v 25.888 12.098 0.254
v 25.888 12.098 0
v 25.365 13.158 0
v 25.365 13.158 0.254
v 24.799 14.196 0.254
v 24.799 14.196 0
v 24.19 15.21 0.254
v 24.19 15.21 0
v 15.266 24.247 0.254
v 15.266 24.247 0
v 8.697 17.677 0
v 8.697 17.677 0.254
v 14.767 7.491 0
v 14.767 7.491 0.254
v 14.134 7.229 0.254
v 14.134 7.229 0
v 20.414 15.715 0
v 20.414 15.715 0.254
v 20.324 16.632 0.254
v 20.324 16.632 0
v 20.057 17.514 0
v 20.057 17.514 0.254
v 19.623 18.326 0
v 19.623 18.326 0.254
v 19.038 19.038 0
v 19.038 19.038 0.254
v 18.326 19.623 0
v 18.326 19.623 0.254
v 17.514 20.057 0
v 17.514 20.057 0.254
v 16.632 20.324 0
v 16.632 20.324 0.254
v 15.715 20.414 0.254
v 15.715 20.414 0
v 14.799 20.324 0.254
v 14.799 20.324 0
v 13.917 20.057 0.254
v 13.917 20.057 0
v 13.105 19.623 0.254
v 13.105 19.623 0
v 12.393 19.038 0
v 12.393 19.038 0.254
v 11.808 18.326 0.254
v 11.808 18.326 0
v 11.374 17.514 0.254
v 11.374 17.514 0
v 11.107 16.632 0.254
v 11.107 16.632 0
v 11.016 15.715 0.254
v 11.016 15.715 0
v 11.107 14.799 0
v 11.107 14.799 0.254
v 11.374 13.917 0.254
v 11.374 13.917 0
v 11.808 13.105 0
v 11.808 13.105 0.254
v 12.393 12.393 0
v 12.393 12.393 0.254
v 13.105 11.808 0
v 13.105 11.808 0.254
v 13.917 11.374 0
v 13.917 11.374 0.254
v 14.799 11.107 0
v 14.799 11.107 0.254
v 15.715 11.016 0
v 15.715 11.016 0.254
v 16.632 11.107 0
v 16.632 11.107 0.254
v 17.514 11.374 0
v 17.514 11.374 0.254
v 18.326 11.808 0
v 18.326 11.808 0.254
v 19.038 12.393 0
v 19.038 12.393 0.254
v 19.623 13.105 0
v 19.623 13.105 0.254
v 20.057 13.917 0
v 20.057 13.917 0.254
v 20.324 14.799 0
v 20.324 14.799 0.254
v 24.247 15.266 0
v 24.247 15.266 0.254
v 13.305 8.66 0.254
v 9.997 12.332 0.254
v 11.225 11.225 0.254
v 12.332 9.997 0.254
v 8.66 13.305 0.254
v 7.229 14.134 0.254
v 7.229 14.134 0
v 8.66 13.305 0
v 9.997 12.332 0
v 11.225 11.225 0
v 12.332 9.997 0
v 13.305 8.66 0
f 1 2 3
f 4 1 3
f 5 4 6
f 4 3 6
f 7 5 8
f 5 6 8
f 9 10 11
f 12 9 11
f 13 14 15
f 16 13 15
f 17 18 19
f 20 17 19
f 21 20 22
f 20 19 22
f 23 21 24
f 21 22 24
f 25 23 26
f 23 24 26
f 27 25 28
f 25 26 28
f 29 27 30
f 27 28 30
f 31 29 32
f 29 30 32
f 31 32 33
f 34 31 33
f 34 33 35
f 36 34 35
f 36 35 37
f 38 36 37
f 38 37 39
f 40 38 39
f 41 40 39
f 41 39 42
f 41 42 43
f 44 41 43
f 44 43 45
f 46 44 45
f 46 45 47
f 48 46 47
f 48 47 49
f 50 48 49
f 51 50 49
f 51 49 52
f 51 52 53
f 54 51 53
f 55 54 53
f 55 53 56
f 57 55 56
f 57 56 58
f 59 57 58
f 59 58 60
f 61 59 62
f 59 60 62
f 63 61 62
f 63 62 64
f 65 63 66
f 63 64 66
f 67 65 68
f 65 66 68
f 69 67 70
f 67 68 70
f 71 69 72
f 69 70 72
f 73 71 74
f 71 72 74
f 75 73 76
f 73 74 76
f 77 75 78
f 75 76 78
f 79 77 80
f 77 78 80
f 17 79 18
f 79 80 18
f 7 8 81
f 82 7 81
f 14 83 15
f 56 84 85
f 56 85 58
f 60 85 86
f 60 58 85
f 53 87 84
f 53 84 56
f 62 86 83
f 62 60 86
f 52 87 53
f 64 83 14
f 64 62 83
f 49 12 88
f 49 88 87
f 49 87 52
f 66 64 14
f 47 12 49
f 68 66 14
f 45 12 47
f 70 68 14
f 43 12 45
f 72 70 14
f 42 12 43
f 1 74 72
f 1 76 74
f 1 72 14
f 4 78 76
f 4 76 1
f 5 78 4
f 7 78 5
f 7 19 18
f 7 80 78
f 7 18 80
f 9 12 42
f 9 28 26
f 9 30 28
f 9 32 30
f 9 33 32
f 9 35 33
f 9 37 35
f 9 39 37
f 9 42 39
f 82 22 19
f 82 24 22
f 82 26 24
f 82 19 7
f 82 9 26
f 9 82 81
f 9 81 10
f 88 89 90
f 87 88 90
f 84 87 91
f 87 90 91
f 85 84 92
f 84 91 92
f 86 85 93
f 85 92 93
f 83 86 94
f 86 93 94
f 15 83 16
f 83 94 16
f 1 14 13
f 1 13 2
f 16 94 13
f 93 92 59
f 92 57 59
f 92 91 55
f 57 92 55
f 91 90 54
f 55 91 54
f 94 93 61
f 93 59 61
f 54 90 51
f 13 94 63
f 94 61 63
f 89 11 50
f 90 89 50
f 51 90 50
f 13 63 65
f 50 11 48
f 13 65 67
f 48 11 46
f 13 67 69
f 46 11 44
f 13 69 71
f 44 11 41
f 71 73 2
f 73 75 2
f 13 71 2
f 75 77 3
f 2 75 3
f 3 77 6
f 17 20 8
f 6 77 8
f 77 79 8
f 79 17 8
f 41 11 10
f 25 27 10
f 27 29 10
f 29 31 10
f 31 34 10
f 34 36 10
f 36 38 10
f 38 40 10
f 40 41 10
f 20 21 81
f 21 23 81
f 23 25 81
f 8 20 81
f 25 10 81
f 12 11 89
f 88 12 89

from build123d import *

# Parameters (mm, degrees)
BOSS_EXTRUDE1_DEPTH = 0.254
SKETCH2_R           = 4.699
CUT_EXTRUDE1_DEPTH  = 1.254
SKETCH3_W           = 2.54
SKETCH3_H           = 0.635
CUT_EXTRUDE2_DEPTH  = 1.254
SKETCH5_OUTSIDE_W   = 121.447
SKETCH5_OUTSIDE_H   = 109.618
CUT_EXTRUDE5_DEPTH  = 1.254


with BuildPart() as part:
    # Sketch1 → Boss-Extrude1 (new body)
    with BuildSketch(Plane.XY):
        with BuildLine():
            Line((67.21146711, 76.191723231), (8.696654013, 17.676910134))
            Line((8.696654013, 17.676910134), (7.228954972, 14.133571205))
            ThreePointArc((7.228954972, 14.133571205), (14.666587579, 6.075099489), (15.105587123, -4.88230096))
            Line((15.105587123, -4.88230096), (18.648926052, -6.35))
            Line((18.648926052, -6.35), (101.401368334, -6.35))
            ThreePointArc((101.401368334, -6.35), (93.866160503, 38.880636728), (67.21146711, 76.191723231))
        make_face()
        with BuildLine():
            Line((88.672924278, 6.35), (27.86051193, 6.35))
            ThreePointArc((27.86051193, 6.35), (26.399857642, 10.93517908), (24.190484974, 15.210228852))
            Line((24.190484974, 15.210228852), (67.191354125, 58.211098004))
            ThreePointArc((67.191354125, 58.211098004), (82.13289044, 34.020557137), (88.672924278, 6.35))
        make_face(mode=Mode.SUBTRACT)
    extrude(amount=BOSS_EXTRUDE1_DEPTH)

    # Sketch2 → Cut-Extrude1 (cut, through all)
    with BuildSketch(Plane.XY.offset(0.254)):
        with Locations((22.225, 0)):
            Circle(SKETCH2_R)
        with Locations((36.195, 0)):
            Circle(SKETCH2_R)
        with Locations((61.722, 0)):
            Circle(SKETCH2_R)
        with Locations((75.692, 0)):
            Circle(SKETCH2_R)
        with Locations((95.25, 0)):
            Circle(SKETCH2_R)
        with Locations((15.715448212, 15.715448212)):
            Circle(SKETCH2_R)
        with Locations((25.593729945, 25.593729945)):
            Circle(SKETCH2_R)
        with Locations((43.644044748, 43.644044748)):
            Circle(SKETCH2_R)
        with Locations((53.522326482, 53.522326482)):
            Circle(SKETCH2_R)
        with Locations((92.004434954, 24.652514046)):
            Circle(SKETCH2_R)
        with Locations((82.48891971, 47.625)):
            Circle(SKETCH2_R)
        with Locations((67.351920908, 67.351920908)):
            Circle(SKETCH2_R)
    extrude(amount=-CUT_EXTRUDE1_DEPTH, mode=Mode.SUBTRACT)

    # Sketch3 → Cut-Extrude2 (cut, through all)
    with BuildSketch(Plane.XY.offset(0.254)):
        Polygon((15.266435406, 24.246691527), (17.06248663, 26.042742751), (17.511499436, 25.593729945), (15.715448212, 23.797678721), align=None)
        Polygon((44.991083167, 53.971339288), (43.195031942, 52.175288063), (43.644044748, 51.726275257), (45.440095973, 53.522326482), align=None)
        with Locations((29.21, -6.0325)):
            Rectangle(SKETCH3_W, SKETCH3_H)
        with Locations((68.707, -6.0325)):
            Rectangle(SKETCH3_W, SKETCH3_H)
        Polygon((29.230733674, 38.210989795), (31.026784898, 40.007041019), (31.475797704, 39.558028213), (29.67974648, 37.761976989), align=None)
        Polygon((56.845021246, 65.825277367), (55.048970022, 64.029226143), (55.497982828, 63.580213337), (57.294034052, 65.376264561), align=None)
        with Locations((48.9585, -6.0325)):
            Rectangle(SKETCH3_W, SKETCH3_H)
        with Locations((85.471, -6.0325)):
            Rectangle(SKETCH3_W, SKETCH3_H)
        Polygon((99.935462164, 14.437711971), (100.266998693, 11.919442024), (101.526133667, 12.085210288), (101.194597138, 14.603480236), align=None)
        Polygon((93.765504959, 37.464305742), (94.938831965, 37.950313702), (93.966816047, 40.296967714), (92.793489041, 39.810959755), align=None)
        Polygon((79.327792988, 62.471156422), (80.874047017, 60.456038938), (81.88160576, 61.229165953), (80.33535173, 63.244283437), align=None)
        Polygon((13.593916116, 7.005422516), (14.565932035, 4.658768503), (15.739259041, 5.144776462), (14.767243123, 7.491430475), align=None)
    extrude(amount=-CUT_EXTRUDE2_DEPTH, mode=Mode.SUBTRACT)

    # Sketch5 outside → Cut-Extrude5 (cut, through all)
    with BuildSketch(Plane.XY.offset(0.254)):
        with Locations((54.4145, 34.921)):
            Rectangle(SKETCH5_OUTSIDE_W, SKETCH5_OUTSIDE_H)
        Polygon((8.194751981, 4.769015505), (26.967984082, 12.545142851), (12.599574288, 26.913552645), (-0.675105435, 13.638872921), align=None, mode=Mode.SUBTRACT)
    extrude(amount=-CUT_EXTRUDE5_DEPTH, mode=Mode.SUBTRACT)


solid = part.part
